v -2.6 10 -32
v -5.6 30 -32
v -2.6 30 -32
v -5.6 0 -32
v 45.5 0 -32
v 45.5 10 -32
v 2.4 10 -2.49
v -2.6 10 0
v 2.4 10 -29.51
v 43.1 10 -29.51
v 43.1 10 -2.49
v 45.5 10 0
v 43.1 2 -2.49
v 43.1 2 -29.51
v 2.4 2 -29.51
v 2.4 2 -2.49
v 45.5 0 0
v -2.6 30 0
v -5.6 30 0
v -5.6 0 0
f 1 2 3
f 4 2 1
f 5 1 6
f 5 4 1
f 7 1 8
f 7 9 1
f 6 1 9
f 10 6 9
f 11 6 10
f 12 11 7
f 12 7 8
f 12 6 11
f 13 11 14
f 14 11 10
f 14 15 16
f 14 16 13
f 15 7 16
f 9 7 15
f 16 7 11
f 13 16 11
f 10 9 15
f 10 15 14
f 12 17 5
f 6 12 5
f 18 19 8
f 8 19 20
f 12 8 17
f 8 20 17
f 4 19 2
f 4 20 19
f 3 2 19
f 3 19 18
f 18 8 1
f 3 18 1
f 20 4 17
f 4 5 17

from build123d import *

# Parameters (mm, degrees)
SKETCH1_W           = 45.5
SKETCH1_H           = 32
BOSS_EXTRUDE1_DEPTH = 10
SKETCH2_W           = 40.7
SKETCH2_H           = 27.02
CUT_EXTRUDE1_DEPTH  = 8
SKETCH3_W           = 32
SKETCH3_H           = 10
BOSS_EXTRUDE2_DEPTH = 5.6
SKETCH4_W           = 3
SKETCH4_H           = 32
BOSS_EXTRUDE3_DEPTH = 20


with BuildPart() as part:
    # Sketch1 → Boss-Extrude1 (new body)
    with BuildSketch(Plane(origin=(0, 0, 0), x_dir=(1, 0, 0), z_dir=(0, 1, 0))):
        with Locations((22.75, 16)):
            Rectangle(SKETCH1_W, SKETCH1_H)
    extrude(amount=BOSS_EXTRUDE1_DEPTH)

    # Sketch2 → Cut-Extrude1 (cut)
    with BuildSketch(Plane(origin=(0, 10, 0), x_dir=(1, 0, 0), z_dir=(0, 1, 0))):
        with Locations((22.749993038, 16.000024748)):
            Rectangle(SKETCH2_W, SKETCH2_H)
    extrude(amount=-CUT_EXTRUDE1_DEPTH, mode=Mode.SUBTRACT)

    # Sketch3 → Boss-Extrude2 (add)
    with BuildSketch(Plane.ZY):
        with Locations((-16, 5)):
            Rectangle(SKETCH3_W, SKETCH3_H)
    extrude(amount=BOSS_EXTRUDE2_DEPTH)

    # Sketch4 → Boss-Extrude3 (add)
    with BuildSketch(Plane(origin=(0, 10, 0), x_dir=(1, 0, 0), z_dir=(0, 1, 0))):
        with Locations((-4.1, 16)):
            Rectangle(SKETCH4_W, SKETCH4_H)
    extrude(amount=BOSS_EXTRUDE3_DEPTH)


solid = part.part
